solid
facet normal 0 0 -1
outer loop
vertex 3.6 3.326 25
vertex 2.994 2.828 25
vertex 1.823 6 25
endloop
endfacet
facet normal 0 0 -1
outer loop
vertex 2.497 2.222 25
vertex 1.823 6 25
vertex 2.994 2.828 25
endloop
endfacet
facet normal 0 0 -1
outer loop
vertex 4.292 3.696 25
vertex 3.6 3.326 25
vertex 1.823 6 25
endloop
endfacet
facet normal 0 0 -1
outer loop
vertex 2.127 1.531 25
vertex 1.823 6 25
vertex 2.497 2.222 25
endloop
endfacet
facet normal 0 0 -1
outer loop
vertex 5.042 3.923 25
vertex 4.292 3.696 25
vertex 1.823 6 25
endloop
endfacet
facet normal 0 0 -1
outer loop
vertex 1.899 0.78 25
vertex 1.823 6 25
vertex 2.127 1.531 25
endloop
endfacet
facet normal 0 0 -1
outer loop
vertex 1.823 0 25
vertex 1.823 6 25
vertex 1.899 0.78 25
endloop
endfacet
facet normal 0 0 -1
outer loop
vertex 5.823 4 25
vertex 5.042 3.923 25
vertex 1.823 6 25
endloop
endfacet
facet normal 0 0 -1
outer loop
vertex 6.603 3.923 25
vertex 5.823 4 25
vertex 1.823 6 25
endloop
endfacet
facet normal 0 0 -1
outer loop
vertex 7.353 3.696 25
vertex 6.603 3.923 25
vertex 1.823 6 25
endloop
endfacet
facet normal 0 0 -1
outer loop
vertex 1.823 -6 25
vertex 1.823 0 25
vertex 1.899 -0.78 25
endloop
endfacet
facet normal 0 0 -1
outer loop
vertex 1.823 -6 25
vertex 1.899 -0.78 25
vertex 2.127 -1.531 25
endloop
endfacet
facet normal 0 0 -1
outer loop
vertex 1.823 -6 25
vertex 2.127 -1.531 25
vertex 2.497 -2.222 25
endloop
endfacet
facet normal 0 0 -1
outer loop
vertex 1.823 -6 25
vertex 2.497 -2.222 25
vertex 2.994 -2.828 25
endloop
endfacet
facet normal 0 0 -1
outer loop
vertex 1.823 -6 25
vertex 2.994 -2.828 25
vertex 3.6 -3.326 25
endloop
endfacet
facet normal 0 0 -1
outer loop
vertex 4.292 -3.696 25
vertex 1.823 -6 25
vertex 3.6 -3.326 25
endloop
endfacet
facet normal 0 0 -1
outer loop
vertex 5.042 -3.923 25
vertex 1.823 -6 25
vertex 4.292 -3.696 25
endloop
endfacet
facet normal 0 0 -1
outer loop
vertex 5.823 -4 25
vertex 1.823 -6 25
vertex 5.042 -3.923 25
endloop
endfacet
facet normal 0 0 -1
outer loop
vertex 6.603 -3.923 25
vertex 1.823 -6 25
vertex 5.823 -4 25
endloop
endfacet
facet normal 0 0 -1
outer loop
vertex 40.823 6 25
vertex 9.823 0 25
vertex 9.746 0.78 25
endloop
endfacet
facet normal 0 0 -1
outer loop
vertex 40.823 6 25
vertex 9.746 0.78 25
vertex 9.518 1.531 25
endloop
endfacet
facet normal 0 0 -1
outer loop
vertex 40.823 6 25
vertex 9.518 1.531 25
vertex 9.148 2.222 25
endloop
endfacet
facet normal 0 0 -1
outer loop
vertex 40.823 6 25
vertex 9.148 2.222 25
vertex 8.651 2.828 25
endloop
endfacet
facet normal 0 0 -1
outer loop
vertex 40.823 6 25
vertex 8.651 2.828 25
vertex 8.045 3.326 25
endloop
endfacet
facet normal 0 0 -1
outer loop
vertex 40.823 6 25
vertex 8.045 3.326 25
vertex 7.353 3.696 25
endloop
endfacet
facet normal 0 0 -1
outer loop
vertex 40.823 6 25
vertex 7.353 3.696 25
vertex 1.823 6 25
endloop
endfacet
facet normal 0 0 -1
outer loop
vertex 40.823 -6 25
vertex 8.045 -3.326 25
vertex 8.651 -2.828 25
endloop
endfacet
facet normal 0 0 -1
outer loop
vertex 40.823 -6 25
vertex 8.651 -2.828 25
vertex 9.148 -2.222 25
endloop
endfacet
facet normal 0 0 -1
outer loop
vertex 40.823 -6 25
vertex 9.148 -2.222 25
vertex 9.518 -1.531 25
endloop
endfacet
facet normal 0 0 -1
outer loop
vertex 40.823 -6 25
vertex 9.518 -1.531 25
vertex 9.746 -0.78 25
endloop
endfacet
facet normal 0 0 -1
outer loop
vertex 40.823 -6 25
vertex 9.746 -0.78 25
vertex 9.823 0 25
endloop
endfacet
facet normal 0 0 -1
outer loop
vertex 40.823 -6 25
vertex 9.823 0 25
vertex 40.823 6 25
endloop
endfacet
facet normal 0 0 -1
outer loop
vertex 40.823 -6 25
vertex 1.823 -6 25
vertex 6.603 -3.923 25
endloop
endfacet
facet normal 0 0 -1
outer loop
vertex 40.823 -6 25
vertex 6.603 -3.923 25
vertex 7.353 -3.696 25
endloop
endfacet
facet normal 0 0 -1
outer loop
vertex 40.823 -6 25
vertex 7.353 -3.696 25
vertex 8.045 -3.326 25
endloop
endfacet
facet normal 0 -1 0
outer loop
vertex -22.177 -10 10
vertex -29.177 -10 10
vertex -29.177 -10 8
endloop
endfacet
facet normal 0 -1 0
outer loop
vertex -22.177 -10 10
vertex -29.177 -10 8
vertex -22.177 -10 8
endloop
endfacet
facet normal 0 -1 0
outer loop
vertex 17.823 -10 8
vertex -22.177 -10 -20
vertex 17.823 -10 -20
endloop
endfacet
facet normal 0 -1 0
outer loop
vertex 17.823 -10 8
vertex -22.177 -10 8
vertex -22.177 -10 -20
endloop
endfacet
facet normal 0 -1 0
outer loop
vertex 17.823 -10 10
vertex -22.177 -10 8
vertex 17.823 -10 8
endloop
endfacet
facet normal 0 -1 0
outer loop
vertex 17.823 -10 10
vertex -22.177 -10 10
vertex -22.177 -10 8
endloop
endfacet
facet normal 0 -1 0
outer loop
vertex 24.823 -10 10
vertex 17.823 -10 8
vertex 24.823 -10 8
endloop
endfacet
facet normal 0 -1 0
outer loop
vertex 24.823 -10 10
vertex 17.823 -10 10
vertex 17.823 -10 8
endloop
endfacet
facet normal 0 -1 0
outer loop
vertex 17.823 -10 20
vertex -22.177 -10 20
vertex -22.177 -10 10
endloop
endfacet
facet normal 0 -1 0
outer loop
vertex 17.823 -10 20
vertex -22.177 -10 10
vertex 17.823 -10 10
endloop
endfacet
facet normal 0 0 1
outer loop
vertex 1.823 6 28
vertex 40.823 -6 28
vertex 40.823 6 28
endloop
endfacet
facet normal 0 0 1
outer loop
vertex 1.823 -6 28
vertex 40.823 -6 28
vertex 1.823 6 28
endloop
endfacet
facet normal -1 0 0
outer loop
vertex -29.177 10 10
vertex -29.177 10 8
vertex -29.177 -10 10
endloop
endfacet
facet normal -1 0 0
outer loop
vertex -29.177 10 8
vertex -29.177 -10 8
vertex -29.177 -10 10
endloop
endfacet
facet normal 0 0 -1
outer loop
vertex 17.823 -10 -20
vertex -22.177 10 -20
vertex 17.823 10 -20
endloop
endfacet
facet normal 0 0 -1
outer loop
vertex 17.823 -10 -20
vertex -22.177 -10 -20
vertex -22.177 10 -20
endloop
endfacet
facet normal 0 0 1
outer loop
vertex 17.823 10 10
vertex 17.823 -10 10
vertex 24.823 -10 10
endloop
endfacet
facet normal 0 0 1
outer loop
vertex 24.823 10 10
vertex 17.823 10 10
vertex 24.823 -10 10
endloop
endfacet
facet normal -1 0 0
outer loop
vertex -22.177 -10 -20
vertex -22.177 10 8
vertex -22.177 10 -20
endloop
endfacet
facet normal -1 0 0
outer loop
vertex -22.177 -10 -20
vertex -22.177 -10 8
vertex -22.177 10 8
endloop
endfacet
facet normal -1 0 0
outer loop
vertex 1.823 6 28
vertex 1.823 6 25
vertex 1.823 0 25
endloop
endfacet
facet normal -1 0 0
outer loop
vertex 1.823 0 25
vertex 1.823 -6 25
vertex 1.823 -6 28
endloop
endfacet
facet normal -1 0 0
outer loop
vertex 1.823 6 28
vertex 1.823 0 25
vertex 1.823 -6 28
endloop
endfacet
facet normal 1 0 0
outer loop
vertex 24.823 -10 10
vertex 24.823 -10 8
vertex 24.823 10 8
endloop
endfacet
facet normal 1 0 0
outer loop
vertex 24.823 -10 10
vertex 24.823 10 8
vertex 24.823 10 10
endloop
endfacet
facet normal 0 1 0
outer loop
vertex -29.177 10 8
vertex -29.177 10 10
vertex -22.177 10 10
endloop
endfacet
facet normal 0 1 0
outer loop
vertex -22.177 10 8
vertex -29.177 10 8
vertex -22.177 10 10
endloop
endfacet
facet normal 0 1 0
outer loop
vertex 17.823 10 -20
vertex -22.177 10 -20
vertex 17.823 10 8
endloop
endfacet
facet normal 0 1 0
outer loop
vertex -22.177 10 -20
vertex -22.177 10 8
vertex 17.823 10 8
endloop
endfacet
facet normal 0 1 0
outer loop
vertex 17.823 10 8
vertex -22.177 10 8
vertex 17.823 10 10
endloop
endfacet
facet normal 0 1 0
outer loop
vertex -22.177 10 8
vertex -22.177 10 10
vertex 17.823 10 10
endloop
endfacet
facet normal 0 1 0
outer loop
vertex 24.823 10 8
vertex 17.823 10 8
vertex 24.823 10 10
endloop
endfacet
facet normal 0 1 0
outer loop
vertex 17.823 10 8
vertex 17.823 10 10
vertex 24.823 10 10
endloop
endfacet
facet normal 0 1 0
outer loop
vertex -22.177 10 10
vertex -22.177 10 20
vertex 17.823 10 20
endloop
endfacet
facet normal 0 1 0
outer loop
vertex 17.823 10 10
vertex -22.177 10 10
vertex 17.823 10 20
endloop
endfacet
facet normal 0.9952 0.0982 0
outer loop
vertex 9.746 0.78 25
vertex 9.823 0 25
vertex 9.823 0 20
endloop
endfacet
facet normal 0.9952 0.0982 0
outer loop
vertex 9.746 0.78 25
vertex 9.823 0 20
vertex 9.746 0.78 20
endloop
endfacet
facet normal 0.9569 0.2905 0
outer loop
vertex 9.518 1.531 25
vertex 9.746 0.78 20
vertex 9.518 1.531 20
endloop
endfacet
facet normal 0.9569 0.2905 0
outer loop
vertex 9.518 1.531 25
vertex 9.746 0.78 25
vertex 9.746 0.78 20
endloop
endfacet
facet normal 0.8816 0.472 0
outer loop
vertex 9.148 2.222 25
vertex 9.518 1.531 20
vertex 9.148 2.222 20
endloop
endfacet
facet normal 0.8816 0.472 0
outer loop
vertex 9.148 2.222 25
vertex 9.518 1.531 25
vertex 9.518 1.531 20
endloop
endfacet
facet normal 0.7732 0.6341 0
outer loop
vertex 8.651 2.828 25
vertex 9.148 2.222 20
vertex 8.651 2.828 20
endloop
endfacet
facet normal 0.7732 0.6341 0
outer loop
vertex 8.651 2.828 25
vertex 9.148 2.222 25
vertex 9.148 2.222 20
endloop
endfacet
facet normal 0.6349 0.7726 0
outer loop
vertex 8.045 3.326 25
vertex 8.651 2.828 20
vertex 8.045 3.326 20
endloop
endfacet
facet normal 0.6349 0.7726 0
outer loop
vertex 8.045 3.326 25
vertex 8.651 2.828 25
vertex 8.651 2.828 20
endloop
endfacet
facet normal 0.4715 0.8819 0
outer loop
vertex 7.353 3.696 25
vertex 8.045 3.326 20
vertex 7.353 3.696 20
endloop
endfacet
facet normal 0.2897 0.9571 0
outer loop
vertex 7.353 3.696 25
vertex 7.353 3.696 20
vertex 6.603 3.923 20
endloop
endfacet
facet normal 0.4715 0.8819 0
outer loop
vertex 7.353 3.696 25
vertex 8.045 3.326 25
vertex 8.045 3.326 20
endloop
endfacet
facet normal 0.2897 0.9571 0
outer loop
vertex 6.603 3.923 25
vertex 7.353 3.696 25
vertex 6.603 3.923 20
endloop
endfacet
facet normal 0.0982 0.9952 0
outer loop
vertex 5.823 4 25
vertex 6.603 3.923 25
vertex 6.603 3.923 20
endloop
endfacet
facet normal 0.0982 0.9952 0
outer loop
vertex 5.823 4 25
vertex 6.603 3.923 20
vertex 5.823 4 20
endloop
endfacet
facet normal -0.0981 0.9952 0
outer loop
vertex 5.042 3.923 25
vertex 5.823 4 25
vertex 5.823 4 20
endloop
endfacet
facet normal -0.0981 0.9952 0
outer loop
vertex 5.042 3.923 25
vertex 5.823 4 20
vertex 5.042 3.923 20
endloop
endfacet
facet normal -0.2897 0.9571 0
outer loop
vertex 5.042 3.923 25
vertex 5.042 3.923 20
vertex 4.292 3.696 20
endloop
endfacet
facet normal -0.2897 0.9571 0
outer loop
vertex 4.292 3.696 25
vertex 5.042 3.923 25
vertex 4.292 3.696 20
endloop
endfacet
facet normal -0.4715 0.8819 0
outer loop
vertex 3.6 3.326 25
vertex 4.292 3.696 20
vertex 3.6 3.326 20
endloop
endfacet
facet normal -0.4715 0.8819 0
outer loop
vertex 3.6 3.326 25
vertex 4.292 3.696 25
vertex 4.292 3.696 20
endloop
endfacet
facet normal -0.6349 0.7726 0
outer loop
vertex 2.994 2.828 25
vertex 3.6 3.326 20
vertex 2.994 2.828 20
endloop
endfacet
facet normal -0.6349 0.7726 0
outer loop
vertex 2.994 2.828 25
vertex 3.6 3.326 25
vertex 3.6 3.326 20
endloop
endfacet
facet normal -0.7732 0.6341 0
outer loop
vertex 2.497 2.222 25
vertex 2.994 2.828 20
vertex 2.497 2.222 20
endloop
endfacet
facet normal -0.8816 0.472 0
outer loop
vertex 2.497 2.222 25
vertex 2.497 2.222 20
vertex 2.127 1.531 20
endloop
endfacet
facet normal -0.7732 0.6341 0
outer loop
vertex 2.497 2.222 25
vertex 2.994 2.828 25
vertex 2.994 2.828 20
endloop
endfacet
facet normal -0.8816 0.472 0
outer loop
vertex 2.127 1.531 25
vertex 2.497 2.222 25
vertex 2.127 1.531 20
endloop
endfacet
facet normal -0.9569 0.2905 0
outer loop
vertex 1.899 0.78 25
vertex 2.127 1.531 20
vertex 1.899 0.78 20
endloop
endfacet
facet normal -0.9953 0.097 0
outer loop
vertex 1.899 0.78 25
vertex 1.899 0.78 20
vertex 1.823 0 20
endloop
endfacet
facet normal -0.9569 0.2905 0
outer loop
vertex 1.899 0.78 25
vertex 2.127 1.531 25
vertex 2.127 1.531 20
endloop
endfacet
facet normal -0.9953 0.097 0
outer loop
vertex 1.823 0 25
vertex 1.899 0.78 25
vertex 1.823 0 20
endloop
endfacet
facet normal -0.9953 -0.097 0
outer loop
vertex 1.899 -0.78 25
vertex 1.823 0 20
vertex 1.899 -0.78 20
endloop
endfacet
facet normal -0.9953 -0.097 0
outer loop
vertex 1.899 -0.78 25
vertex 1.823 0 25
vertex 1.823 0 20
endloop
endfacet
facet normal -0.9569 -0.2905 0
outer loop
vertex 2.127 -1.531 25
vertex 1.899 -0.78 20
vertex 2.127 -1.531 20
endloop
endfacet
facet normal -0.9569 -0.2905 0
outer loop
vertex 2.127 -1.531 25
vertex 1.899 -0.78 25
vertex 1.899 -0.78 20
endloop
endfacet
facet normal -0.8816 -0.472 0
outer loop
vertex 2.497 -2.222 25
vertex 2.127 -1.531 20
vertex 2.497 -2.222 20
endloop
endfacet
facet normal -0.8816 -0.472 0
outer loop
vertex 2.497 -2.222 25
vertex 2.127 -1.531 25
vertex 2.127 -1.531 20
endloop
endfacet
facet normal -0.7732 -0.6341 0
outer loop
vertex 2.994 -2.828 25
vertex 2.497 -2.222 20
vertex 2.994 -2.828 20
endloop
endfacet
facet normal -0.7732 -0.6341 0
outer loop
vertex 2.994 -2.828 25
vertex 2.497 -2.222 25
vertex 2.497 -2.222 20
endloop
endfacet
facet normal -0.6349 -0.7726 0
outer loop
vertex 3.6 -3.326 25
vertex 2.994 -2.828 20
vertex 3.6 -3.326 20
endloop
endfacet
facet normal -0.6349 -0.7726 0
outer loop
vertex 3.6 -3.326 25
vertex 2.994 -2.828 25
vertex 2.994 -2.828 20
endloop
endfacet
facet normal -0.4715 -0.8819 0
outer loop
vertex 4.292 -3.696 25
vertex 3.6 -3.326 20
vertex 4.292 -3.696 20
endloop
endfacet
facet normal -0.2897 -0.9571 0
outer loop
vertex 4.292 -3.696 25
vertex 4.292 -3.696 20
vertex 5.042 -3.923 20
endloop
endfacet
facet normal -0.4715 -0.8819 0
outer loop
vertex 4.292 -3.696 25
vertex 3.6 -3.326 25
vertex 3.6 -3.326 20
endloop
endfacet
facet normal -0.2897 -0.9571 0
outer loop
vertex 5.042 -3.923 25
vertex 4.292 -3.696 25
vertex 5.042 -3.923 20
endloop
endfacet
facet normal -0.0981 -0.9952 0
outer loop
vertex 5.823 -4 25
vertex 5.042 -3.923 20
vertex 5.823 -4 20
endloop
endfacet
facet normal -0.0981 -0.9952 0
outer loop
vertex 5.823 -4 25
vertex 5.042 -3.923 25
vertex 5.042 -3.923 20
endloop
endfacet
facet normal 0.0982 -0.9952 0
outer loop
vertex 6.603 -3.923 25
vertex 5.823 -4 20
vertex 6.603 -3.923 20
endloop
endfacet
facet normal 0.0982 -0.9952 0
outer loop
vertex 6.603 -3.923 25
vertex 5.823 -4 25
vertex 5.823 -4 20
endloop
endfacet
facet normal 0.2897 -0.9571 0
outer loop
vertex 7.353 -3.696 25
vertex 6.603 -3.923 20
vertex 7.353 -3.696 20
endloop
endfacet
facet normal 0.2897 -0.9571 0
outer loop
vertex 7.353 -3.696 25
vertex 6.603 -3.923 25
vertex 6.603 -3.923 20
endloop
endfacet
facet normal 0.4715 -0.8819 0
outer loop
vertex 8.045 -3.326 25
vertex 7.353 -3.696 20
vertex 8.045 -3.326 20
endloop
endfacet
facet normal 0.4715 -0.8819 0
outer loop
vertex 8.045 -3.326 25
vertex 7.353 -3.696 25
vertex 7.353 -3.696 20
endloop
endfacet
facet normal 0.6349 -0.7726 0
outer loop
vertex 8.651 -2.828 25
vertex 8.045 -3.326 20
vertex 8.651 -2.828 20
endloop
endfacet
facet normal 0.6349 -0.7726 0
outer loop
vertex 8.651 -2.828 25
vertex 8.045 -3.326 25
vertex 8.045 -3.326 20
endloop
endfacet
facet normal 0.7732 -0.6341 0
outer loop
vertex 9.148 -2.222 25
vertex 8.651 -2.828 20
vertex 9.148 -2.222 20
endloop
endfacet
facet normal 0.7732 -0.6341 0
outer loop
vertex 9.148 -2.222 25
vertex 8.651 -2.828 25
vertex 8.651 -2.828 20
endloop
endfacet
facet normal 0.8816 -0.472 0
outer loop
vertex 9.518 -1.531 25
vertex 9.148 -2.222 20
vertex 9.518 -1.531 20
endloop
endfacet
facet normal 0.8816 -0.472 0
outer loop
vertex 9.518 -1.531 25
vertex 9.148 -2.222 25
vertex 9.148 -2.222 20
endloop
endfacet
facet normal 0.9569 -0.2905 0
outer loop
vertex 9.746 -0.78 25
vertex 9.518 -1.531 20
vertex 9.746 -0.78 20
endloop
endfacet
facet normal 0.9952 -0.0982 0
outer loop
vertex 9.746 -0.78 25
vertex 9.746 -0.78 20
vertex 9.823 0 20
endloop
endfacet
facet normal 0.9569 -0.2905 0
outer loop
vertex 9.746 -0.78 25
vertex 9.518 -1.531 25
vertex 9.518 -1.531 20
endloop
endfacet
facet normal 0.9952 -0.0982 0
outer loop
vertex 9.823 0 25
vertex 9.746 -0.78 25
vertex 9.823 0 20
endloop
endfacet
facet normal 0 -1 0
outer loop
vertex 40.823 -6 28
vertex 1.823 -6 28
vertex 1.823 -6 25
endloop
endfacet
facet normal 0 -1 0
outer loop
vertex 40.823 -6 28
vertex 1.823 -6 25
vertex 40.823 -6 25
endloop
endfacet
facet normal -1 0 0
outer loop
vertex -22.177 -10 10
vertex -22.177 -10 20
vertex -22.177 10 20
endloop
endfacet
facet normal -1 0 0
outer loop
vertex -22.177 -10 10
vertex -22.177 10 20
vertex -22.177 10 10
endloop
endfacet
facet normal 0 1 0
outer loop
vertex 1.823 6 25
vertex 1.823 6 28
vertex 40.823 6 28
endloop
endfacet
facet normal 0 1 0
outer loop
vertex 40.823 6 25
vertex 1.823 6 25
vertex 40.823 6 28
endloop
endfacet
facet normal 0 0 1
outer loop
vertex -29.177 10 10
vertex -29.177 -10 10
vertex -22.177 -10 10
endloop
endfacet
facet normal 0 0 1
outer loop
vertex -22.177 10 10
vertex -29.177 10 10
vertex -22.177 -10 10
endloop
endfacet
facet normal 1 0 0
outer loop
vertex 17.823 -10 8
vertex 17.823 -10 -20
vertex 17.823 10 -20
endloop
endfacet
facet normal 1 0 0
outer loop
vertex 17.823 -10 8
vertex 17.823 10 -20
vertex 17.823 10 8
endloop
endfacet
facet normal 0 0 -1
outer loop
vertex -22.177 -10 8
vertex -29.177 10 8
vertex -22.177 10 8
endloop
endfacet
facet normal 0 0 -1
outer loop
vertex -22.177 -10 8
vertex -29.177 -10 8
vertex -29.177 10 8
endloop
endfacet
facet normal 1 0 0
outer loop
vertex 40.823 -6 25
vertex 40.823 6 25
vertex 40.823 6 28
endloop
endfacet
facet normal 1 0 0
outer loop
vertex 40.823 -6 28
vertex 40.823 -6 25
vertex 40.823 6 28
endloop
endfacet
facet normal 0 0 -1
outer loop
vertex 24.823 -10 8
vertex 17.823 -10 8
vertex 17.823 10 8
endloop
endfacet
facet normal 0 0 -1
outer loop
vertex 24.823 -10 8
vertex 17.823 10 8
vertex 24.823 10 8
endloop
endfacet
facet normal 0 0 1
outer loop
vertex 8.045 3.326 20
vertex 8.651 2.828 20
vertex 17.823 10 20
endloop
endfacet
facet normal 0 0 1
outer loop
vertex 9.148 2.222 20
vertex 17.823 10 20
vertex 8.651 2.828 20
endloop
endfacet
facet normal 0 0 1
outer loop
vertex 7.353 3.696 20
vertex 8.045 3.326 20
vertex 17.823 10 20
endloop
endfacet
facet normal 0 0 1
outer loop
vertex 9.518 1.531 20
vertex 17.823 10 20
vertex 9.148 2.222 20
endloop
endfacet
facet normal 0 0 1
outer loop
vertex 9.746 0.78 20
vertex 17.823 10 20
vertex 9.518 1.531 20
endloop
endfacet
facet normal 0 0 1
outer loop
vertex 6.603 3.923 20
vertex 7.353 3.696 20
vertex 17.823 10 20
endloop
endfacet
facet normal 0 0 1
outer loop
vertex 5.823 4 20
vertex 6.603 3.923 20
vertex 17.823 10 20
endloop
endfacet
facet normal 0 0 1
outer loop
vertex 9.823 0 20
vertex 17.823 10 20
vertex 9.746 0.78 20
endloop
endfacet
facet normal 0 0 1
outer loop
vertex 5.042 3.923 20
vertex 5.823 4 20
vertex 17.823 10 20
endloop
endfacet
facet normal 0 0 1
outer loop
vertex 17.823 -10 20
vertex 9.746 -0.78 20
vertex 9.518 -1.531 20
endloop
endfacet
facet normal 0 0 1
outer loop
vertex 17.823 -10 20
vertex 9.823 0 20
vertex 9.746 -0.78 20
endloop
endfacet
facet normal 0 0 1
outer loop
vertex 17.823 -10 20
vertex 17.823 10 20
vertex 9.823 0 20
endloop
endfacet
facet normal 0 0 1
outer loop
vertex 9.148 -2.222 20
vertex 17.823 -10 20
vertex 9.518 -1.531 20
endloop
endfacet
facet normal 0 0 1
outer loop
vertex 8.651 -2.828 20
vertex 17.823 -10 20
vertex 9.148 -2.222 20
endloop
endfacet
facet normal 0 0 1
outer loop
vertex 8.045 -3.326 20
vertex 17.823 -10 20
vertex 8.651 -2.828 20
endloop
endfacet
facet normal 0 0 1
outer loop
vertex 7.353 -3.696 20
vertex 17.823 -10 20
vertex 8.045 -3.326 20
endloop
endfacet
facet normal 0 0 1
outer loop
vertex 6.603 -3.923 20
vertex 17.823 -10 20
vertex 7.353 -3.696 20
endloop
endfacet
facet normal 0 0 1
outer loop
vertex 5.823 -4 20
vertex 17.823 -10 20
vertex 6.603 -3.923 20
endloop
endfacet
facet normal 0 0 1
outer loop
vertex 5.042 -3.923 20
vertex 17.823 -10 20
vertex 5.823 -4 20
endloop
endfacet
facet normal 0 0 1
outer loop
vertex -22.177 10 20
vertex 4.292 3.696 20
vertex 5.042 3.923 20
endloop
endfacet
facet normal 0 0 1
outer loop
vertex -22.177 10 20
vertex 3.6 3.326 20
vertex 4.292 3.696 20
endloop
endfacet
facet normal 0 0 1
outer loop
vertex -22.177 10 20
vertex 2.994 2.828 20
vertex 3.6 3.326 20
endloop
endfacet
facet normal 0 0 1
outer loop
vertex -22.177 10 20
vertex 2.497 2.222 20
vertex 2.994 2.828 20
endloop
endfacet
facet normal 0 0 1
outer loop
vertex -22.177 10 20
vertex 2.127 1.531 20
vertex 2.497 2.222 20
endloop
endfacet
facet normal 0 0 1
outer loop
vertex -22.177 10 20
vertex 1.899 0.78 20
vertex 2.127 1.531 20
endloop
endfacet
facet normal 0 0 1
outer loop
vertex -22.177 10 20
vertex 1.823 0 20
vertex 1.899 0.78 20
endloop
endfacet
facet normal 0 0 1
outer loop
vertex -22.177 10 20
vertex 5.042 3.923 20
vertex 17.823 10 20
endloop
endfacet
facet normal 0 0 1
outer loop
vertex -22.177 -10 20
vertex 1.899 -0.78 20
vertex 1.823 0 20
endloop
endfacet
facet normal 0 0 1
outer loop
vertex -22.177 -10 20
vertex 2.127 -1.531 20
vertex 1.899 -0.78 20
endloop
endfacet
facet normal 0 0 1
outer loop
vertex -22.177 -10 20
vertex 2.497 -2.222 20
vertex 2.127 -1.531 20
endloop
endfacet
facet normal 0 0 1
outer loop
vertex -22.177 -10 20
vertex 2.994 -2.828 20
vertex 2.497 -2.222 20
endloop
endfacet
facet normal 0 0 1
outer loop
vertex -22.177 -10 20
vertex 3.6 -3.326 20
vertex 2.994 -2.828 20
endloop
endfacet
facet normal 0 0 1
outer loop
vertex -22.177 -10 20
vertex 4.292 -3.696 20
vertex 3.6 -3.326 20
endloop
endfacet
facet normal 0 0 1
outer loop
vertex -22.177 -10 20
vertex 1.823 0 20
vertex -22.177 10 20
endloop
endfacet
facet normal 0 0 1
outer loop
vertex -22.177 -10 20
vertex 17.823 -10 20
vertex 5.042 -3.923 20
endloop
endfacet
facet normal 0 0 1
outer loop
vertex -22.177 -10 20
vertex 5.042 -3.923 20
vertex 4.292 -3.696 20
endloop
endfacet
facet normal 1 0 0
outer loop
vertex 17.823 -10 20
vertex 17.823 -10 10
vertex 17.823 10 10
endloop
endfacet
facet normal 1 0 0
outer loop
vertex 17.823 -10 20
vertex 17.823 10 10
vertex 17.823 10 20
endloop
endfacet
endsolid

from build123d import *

# Parameters (mm, degrees)
F0_W     = 7
F0_H     = 2
F1_DEPTH = 10
F0_W_2   = 4
F0_H_2   = 5
F0_H_3   = 3
F3_DEPTH = 6


with BuildPart() as f1:
    # F0 (on Front) → F1 (new body, symmetric)
    with BuildSketch(Plane.XZ):
        Polygon((-22.17742, -20), (17.82258, -20), (17.82258, 8), (17.82258, 10), (17.82258, 20), (9.82258, 20), (5.82258, 20), (-22.17742, 20), (-22.17742, 10), (-22.17742, 8), align=None)
        with Locations((-25.67742, 9)):
            Rectangle(F0_W, F0_H)
        with Locations((21.32258, 9)):
            Rectangle(F0_W, F0_H)
    extrude(amount=F1_DEPTH, both=True)

    # F0 (on Front) → F2 (revolve)
    with BuildSketch(Plane.XZ):
        with Locations((7.82258, 22.5)):
            Rectangle(F0_W_2, F0_H_2)
    revolve(axis=Axis((5.82258, 0, 22.5), (0, 0, 1)))

    # F0 (on Front) → F3 (join, symmetric)
    with BuildSketch(Plane.XZ):
        with Locations((3.82258, 26.5)):
            Rectangle(F0_W_2, F0_H_3)
        Polygon((5.82258, 25), (9.82258, 25), (40.82258, 25), (40.82258, 28), (5.82258, 28), align=None)
    extrude(amount=F3_DEPTH, both=True)


solid = f1.part
